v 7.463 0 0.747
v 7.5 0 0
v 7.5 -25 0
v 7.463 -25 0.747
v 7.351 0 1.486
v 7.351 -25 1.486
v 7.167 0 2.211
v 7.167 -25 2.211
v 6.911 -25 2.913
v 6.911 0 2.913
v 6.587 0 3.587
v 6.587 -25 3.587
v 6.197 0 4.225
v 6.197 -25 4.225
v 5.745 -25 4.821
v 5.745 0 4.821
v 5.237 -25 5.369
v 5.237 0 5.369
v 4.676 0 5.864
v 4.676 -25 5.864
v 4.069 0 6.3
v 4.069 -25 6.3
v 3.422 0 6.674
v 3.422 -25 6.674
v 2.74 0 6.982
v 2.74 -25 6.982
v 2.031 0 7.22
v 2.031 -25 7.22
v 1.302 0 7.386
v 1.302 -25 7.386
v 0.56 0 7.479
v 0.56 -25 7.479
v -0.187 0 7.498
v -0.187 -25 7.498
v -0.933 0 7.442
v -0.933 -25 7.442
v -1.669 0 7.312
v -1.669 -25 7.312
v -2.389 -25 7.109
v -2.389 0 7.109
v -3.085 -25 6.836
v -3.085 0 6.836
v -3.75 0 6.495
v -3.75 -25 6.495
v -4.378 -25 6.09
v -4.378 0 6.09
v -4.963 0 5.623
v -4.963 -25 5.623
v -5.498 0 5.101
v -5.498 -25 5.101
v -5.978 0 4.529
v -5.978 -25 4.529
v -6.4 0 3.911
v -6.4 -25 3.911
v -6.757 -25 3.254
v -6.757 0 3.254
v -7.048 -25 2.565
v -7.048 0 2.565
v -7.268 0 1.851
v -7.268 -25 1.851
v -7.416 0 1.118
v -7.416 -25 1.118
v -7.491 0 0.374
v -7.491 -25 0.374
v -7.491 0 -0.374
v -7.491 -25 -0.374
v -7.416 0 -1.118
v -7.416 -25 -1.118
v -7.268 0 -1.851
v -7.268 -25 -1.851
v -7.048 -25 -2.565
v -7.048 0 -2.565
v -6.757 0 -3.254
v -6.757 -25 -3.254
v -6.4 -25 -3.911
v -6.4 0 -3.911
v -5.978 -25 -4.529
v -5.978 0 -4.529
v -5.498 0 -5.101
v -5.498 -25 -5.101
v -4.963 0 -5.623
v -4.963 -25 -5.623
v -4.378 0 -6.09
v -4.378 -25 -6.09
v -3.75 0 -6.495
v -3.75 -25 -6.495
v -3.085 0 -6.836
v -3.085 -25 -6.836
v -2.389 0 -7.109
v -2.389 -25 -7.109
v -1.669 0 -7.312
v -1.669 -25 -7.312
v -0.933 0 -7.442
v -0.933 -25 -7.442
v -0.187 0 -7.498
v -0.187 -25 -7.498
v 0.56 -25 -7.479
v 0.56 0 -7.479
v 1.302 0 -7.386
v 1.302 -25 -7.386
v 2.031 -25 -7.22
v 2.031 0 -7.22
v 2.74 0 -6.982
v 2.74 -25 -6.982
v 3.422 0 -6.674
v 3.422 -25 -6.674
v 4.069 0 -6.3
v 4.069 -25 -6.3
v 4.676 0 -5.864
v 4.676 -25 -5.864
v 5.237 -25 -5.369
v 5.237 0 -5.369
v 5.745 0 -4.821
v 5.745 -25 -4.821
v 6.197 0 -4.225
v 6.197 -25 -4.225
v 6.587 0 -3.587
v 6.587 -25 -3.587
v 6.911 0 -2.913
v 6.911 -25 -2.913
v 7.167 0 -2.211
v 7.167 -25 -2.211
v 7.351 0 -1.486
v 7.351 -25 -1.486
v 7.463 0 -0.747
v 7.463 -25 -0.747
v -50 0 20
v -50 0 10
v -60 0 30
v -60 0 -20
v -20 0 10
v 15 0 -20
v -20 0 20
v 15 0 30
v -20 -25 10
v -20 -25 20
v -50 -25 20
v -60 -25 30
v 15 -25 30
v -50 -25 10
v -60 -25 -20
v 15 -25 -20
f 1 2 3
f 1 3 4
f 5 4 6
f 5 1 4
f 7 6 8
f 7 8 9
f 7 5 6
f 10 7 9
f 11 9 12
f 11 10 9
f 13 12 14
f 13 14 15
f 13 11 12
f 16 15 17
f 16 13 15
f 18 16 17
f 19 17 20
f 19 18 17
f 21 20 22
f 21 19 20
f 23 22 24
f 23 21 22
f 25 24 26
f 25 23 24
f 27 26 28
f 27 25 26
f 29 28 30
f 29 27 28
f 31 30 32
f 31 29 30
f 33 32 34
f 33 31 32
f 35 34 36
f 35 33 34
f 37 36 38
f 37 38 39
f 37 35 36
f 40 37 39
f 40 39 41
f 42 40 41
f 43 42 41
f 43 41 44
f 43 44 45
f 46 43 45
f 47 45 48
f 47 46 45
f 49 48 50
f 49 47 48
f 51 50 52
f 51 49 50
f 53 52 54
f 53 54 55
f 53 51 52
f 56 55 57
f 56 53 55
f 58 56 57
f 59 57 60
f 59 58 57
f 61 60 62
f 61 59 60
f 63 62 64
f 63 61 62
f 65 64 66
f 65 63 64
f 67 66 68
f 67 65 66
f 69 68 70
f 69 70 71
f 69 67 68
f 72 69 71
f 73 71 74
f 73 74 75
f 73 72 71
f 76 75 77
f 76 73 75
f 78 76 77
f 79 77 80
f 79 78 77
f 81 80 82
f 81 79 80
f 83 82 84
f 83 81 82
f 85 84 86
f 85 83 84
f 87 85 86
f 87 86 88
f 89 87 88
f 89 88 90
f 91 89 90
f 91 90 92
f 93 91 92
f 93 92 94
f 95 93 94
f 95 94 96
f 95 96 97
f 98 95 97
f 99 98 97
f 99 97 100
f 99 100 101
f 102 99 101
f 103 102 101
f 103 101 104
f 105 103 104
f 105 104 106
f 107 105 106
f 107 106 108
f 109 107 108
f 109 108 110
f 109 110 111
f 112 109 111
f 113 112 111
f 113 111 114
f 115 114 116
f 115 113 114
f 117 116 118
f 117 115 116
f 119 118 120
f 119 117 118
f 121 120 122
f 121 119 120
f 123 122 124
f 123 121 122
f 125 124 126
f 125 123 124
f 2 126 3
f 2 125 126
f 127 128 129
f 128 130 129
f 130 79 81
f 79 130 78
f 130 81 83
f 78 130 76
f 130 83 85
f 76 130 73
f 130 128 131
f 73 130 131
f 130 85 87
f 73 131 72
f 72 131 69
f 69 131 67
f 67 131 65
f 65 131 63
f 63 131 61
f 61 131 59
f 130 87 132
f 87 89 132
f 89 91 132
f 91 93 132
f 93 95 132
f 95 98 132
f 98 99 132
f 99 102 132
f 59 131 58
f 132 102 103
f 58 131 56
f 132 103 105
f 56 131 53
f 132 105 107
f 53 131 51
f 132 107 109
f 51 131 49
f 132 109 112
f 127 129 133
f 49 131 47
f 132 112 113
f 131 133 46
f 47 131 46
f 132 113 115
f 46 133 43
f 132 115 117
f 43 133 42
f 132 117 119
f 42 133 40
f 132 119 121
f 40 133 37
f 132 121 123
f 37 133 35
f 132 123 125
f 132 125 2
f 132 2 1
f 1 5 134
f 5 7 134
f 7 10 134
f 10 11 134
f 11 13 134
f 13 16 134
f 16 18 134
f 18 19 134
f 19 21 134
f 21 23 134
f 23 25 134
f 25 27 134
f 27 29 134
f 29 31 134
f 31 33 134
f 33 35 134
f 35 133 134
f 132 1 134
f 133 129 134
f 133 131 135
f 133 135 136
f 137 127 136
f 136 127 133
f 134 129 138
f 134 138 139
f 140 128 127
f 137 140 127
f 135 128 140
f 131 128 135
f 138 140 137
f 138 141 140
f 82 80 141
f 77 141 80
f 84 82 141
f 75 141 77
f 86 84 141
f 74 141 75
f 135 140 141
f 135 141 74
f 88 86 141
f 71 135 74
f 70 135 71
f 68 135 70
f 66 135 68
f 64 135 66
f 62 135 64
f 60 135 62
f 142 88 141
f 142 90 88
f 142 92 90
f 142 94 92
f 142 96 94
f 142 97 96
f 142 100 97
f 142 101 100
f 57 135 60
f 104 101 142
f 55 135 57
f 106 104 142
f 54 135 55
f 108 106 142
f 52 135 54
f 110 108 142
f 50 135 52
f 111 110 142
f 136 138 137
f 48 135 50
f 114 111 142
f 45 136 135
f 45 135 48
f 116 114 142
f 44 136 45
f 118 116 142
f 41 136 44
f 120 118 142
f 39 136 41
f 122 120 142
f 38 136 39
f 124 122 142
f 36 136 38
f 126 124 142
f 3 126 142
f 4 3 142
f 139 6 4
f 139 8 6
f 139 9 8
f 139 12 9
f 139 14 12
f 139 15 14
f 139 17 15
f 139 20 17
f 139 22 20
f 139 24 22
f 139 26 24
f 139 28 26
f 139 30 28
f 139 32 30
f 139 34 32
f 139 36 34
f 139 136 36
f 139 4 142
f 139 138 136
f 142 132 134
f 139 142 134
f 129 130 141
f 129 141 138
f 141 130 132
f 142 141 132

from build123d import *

# Parameters (mm, degrees)
F0_W     = 75
F0_H     = 50
F0_R     = 7.5
F0_W_2   = 30
F0_H_2   = 10
F1_DEPTH = 25


with BuildPart() as f1:
    # F0 (on Front) → F1 (new body)
    with BuildSketch(Plane.XZ):
        with Locations((-22.5, 5)):
            Rectangle(F0_W, F0_H)
        Circle(F0_R, mode=Mode.SUBTRACT)
        with Locations((-35, 15)):
            Rectangle(F0_W_2, F0_H_2, mode=Mode.SUBTRACT)
    extrude(amount=F1_DEPTH)


solid = f1.part
